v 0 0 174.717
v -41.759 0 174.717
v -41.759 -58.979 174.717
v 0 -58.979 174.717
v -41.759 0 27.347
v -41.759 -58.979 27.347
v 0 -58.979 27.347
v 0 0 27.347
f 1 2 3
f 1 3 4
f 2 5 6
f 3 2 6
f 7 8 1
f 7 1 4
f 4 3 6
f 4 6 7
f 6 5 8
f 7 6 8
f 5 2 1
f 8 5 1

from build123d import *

# Parameters (mm, degrees)
F0_W     = 41.7591929436
F0_H     = 21.8034684658
F1_DEPTH = 58.9789152145
F2_T     = -0.1
F3_DEPTH = 147.3701298237
F4_DEPTH = 21.0949573666


with BuildPart() as f1:
    # F0 (on Front) → F1 (new body)
    with BuildSketch(Plane.XZ):
        with Locations((-20.8795964718, 38.2484644651)):
            Rectangle(F0_W, F0_H)
    extrude(amount=F1_DEPTH)

    # F2
    f2_openings = [f1.faces().sort_by_distance(p)[0] for p in [
        (-20.879596, -29.489458, 49.150199),
    ]]
    offset(amount=F2_T, openings=f2_openings)

    # F3 (add): a face of the model
    f3_faces = [f1.faces().sort_by_distance(p)[0] for p in [
        (-20.8795964718, -29.4894576073, 27.3467302322),
    ]]
    extrude(f3_faces, amount=-F3_DEPTH)

    # F4 (add): a face of the model
    f4_faces = [f1.faces().sort_by_distance(p)[0] for p in [
        (-20.8795964718, -29.4894576073, 174.7168600559),
    ]]
    extrude(f4_faces, amount=-F4_DEPTH)


solid = f1.part
